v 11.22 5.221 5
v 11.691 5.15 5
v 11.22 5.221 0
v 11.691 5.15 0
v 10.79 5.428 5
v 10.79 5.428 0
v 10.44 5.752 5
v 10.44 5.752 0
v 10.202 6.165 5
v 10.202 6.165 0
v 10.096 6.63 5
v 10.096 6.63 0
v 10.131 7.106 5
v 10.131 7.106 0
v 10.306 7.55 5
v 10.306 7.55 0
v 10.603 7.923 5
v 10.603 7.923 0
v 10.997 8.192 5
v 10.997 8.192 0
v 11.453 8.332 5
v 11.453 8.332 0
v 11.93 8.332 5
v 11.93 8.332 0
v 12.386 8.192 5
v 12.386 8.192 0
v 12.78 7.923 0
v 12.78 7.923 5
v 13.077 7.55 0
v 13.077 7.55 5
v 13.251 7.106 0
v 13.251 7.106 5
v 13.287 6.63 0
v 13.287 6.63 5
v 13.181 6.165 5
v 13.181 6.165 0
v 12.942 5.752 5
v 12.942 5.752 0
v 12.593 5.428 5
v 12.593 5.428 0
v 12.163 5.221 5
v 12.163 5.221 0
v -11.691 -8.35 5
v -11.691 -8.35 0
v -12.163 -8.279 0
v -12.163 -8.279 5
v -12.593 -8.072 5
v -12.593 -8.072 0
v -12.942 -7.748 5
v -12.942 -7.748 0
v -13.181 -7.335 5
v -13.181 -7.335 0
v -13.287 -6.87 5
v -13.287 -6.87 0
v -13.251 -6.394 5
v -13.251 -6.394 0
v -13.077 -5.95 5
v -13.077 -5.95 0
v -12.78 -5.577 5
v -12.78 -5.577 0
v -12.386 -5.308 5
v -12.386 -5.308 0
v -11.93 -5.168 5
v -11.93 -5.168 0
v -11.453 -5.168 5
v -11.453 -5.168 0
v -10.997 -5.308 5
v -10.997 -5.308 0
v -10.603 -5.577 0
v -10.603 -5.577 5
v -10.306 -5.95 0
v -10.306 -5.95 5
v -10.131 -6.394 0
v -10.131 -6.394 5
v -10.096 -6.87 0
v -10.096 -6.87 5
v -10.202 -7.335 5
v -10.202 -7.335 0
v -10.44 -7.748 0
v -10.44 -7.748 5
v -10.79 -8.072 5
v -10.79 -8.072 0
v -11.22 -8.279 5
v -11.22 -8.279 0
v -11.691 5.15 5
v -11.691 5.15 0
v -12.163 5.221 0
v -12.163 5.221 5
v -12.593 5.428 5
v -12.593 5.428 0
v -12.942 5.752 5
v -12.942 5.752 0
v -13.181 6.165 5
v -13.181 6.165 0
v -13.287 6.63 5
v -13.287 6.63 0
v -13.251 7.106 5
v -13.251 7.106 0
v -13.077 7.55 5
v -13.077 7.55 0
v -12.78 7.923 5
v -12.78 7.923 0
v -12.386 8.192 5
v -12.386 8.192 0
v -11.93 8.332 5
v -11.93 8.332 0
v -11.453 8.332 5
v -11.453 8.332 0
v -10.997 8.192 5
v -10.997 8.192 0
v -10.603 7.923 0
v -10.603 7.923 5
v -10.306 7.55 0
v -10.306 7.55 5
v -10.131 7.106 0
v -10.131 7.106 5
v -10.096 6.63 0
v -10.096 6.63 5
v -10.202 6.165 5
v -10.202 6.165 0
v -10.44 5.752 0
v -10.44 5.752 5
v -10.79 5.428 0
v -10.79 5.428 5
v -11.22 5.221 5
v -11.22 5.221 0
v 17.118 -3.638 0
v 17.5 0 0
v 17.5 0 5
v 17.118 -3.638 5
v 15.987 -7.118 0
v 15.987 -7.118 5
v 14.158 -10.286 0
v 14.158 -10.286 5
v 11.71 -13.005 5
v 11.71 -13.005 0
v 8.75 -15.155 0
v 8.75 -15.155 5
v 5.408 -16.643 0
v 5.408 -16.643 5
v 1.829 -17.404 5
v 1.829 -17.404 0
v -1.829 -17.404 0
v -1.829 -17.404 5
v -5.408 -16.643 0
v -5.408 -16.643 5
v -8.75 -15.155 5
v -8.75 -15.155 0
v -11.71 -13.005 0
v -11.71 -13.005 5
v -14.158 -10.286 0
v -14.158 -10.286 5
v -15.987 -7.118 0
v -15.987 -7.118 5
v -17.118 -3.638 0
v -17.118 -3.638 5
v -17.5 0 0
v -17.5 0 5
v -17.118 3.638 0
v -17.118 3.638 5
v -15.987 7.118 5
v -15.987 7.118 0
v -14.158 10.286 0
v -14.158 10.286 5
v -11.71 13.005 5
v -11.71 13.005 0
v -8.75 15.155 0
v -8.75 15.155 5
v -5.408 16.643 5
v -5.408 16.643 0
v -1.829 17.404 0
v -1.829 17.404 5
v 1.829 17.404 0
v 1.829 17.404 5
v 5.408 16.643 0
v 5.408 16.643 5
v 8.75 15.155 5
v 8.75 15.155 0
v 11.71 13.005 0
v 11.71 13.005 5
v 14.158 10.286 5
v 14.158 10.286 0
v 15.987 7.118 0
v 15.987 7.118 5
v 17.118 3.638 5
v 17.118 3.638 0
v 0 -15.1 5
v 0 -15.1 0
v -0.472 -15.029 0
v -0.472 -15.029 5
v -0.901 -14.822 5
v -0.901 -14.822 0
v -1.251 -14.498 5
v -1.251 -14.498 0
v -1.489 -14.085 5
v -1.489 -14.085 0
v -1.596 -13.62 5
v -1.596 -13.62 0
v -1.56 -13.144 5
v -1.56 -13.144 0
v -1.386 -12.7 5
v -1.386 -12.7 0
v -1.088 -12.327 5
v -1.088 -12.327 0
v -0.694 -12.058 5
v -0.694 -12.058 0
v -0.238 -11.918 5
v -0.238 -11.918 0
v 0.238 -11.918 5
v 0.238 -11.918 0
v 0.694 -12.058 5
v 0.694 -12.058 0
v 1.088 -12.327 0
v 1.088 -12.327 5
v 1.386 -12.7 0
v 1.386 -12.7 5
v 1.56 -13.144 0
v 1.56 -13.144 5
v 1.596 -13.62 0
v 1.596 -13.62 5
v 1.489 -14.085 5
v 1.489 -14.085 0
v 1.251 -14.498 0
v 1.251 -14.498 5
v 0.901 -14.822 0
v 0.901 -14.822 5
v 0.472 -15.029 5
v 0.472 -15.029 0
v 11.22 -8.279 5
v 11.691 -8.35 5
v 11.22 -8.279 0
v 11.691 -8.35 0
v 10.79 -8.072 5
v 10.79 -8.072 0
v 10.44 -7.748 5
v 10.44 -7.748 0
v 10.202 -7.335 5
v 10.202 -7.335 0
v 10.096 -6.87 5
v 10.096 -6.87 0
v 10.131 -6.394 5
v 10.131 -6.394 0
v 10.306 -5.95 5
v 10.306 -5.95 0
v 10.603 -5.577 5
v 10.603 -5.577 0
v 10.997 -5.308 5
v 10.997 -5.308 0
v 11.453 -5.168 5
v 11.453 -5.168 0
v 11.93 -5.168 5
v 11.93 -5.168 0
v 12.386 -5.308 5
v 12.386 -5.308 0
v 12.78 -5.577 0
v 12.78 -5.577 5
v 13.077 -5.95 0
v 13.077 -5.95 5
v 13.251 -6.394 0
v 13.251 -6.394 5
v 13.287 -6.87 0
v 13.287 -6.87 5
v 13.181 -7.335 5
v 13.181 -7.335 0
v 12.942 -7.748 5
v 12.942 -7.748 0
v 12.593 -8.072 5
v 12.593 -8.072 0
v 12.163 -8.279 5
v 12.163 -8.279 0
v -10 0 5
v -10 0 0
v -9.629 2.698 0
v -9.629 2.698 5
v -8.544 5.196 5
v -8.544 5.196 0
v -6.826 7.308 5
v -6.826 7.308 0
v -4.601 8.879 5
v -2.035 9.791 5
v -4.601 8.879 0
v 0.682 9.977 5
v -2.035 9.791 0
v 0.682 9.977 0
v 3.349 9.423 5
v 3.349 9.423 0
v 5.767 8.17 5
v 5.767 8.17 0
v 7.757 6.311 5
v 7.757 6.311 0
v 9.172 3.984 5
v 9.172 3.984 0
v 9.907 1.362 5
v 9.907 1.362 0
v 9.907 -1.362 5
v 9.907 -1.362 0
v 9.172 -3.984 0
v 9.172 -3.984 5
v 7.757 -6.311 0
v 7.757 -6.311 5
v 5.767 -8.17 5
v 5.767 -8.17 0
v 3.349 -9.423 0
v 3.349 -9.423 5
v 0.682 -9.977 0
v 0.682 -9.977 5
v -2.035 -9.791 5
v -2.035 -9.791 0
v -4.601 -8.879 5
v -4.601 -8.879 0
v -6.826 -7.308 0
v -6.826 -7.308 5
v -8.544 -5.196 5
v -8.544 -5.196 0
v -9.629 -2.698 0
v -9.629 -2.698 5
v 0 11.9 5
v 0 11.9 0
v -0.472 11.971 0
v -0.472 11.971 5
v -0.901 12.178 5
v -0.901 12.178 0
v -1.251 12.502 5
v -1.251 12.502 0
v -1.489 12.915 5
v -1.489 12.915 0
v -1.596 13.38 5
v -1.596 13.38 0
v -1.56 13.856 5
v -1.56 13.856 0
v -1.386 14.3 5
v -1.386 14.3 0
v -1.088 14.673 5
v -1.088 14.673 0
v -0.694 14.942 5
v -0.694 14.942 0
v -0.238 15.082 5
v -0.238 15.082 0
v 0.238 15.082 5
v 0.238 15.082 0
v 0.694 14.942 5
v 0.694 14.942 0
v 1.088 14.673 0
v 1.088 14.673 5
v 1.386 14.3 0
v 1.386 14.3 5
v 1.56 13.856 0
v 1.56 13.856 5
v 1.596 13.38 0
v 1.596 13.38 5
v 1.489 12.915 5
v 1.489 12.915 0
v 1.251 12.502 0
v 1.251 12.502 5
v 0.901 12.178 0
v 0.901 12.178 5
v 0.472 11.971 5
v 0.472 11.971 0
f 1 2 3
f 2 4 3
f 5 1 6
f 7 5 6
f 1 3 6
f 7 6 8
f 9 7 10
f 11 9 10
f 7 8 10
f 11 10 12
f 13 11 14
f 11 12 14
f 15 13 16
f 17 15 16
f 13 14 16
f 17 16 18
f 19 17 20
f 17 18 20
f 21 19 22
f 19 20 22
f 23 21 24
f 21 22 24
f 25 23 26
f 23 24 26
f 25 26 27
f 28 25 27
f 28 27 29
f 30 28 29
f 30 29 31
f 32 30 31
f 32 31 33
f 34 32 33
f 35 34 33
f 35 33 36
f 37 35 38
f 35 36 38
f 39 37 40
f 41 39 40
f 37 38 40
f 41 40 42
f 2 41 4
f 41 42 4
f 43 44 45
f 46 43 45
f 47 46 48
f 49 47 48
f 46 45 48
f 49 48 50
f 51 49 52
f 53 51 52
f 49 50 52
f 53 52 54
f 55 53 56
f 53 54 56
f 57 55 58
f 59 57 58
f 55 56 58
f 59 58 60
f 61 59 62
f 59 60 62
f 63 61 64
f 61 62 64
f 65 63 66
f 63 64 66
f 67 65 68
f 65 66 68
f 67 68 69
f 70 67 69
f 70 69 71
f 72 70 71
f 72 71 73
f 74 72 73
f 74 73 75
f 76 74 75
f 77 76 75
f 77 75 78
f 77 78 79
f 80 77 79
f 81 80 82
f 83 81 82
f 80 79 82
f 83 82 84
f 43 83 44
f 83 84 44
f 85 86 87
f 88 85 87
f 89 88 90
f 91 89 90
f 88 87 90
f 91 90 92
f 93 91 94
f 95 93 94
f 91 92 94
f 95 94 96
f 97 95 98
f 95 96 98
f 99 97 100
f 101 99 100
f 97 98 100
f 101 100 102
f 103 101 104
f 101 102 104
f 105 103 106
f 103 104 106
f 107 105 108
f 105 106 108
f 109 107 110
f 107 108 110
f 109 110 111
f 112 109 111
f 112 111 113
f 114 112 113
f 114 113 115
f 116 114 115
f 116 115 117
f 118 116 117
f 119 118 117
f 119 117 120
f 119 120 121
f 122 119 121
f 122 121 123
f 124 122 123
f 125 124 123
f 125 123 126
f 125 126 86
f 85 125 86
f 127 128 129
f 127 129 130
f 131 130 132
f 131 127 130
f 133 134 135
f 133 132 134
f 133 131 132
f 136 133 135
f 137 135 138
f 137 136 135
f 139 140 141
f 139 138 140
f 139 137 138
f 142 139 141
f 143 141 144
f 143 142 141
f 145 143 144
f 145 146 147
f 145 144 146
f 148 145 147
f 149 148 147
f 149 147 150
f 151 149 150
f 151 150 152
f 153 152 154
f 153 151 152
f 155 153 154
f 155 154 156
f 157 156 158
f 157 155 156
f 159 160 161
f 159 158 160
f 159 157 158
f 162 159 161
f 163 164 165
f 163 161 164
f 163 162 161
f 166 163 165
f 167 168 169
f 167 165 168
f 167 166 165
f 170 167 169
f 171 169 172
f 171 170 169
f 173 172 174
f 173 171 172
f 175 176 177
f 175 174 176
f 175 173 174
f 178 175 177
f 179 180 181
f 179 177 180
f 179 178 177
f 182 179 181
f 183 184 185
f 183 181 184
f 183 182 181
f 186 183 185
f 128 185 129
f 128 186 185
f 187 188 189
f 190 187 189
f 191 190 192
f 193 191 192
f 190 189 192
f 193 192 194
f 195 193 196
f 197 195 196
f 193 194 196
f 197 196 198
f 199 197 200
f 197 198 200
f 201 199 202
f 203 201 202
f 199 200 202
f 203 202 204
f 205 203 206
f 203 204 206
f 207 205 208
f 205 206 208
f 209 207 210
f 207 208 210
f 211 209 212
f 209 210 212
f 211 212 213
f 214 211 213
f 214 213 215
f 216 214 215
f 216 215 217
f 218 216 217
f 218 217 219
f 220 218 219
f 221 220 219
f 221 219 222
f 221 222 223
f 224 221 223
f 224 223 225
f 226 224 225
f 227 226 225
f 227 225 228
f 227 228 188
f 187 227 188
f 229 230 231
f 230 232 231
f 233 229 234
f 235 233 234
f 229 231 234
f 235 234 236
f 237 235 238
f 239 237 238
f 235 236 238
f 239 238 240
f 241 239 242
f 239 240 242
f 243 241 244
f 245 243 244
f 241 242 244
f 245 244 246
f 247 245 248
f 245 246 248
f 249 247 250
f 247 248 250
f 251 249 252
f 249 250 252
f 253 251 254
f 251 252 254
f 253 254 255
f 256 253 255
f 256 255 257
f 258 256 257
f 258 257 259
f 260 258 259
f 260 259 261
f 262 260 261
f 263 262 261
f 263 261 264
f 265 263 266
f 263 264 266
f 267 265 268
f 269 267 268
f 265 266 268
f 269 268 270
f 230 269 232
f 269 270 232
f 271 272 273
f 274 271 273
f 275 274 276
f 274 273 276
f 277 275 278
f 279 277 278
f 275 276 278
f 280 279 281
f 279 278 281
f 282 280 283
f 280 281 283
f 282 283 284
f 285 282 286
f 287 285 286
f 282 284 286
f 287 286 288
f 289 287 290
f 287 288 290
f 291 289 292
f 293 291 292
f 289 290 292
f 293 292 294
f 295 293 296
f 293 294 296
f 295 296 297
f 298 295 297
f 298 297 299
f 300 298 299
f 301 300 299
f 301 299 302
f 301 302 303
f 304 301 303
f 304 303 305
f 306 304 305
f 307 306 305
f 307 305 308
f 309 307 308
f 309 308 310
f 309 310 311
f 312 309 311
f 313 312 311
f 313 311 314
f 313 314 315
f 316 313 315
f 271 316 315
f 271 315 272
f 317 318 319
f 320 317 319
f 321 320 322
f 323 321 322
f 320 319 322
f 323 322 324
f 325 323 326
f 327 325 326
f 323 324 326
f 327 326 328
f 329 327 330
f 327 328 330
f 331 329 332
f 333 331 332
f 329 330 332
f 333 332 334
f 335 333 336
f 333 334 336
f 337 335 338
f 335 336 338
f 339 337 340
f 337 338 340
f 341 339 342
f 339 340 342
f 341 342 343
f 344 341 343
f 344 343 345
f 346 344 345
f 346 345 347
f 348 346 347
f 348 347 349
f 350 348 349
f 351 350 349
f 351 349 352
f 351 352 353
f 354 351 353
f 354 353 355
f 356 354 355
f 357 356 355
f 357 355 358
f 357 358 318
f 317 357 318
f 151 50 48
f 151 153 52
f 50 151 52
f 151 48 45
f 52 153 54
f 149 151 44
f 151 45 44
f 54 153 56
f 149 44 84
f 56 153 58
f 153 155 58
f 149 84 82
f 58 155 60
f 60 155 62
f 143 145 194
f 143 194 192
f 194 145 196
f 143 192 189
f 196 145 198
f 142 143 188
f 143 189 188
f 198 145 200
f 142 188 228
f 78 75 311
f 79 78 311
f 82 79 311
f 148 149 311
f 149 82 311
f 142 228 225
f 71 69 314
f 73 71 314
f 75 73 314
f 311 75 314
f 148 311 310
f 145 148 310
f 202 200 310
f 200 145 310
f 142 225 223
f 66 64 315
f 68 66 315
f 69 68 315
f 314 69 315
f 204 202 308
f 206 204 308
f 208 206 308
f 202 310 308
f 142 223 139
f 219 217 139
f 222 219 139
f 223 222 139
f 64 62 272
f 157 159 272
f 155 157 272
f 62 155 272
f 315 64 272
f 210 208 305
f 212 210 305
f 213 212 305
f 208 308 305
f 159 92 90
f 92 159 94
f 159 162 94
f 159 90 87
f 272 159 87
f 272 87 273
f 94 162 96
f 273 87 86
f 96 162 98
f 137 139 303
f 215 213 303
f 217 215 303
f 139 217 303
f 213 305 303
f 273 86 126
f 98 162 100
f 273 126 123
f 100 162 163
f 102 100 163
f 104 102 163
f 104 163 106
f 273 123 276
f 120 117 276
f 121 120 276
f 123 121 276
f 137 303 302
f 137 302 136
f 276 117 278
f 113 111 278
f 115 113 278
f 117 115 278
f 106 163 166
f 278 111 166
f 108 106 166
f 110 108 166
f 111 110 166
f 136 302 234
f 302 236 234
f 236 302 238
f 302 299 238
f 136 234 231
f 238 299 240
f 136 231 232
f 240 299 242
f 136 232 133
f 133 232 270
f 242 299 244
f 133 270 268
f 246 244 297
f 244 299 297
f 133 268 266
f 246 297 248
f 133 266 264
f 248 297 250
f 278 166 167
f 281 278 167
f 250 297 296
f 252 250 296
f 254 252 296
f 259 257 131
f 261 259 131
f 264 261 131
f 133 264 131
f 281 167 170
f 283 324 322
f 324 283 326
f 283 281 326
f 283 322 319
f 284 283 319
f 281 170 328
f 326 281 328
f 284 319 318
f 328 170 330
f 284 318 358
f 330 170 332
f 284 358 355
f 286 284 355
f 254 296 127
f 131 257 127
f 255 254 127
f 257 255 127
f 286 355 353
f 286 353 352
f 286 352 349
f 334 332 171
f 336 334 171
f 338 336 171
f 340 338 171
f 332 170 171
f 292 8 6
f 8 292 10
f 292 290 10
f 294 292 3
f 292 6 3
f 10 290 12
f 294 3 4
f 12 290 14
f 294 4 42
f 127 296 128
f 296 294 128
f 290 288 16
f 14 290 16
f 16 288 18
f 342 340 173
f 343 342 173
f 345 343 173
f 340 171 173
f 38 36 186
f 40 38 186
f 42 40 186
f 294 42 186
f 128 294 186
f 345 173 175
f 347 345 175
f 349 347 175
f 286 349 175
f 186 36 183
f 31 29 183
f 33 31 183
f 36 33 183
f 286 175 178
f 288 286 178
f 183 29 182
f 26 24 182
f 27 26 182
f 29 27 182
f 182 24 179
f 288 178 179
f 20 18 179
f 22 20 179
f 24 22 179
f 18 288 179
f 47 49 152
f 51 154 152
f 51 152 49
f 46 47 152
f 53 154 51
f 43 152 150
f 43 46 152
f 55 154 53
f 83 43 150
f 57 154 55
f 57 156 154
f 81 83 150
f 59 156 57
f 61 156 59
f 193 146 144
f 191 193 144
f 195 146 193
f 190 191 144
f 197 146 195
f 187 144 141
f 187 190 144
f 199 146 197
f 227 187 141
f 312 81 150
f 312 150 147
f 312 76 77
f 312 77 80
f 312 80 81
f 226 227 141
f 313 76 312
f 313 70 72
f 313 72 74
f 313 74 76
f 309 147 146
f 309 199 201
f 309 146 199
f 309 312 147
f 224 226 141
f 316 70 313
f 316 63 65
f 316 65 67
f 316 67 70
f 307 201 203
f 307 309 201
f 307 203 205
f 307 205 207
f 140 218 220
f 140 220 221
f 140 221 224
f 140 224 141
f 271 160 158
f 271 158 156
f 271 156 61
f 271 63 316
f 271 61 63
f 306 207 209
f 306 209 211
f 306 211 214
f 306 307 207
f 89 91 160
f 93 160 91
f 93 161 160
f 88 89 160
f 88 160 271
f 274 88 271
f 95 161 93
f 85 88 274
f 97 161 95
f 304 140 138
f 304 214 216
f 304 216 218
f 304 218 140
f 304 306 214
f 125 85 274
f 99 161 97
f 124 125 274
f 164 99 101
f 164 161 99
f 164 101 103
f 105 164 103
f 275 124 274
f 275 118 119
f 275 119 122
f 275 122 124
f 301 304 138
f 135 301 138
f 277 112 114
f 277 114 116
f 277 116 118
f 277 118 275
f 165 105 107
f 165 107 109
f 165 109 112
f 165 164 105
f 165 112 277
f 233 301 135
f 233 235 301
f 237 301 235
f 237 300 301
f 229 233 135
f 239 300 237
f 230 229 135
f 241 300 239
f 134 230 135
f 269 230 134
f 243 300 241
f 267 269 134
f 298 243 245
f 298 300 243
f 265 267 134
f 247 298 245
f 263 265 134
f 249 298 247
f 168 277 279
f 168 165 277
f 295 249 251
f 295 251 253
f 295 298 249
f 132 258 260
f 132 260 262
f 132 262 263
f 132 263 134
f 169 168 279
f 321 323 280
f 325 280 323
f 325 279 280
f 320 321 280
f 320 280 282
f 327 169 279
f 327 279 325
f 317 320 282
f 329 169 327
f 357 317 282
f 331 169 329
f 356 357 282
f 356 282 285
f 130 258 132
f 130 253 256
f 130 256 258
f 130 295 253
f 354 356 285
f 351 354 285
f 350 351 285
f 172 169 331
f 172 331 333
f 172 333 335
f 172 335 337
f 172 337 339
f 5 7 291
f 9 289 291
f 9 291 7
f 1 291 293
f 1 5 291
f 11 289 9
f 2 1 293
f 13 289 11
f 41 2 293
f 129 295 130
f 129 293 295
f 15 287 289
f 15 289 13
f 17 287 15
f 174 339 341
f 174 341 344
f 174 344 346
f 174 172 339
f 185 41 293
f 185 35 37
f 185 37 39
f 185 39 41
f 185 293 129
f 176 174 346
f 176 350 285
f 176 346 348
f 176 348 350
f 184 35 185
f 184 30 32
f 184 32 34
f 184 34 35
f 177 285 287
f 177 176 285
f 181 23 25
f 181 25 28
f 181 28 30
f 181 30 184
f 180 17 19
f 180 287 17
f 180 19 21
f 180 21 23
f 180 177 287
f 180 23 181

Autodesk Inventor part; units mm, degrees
ref_plane "YZ Plane" through (0, 0, 0) normal (1, 0, 0) x (0, 1, 0)
ref_plane "XZ Plane" through (0, 0, 0) normal (0, 1, 0) x (-1, 0, 0)
ref_plane "XY Plane" through (0, 0, 0) normal (0, 0, 1) x (1, 0, 0)
sketch "スケッチ1" plane through (0, 0, 0) normal (0, 0, 1) x (1, 0, 0)
  circle A0 centre (0, 0) radius 17.5
  dimension "d0" = 35
extrude "押し出し1" add sketch "スケッチ1" along normal blind 5
sketch "スケッチ2" plane through (0, 0, 5) normal (0, 0, 1) x (1, 0, 0)
  circle A0 centre (0, 0) radius 13.5
  point P0 (0, 13.5)
  point P1 (-11.6913, 6.75)
  point P2 (-11.6913, -6.75)
  point P3 (0, -13.5)
  point P4 (11.6913, -6.75)
  point P5 (11.6913, 6.75)
  dimension "d3" = 27
  dimension "d6" = 360
hole "穴1" at (0, 13.5, 5) at (-11.6913, 6.75, 5) at (-11.6913, -6.75, 5) at (0, -13.5, 5) at (11.6913, -6.75, 5) at (11.6913, 6.75, 5) direction (0, 0, -1) diameter 3.2 end through all
sketch "スケッチ3" plane through (0, 0, 0) normal (0, 0, -1) x (-1, 0, 0)
  circle A0 centre (0, 0) radius 10
  dimension "d15" = 20
extrude "押し出し2" cut sketch "スケッチ3" against normal blind 5
properties part number "servohorn_forR0" material "アルミニウム 6061"
